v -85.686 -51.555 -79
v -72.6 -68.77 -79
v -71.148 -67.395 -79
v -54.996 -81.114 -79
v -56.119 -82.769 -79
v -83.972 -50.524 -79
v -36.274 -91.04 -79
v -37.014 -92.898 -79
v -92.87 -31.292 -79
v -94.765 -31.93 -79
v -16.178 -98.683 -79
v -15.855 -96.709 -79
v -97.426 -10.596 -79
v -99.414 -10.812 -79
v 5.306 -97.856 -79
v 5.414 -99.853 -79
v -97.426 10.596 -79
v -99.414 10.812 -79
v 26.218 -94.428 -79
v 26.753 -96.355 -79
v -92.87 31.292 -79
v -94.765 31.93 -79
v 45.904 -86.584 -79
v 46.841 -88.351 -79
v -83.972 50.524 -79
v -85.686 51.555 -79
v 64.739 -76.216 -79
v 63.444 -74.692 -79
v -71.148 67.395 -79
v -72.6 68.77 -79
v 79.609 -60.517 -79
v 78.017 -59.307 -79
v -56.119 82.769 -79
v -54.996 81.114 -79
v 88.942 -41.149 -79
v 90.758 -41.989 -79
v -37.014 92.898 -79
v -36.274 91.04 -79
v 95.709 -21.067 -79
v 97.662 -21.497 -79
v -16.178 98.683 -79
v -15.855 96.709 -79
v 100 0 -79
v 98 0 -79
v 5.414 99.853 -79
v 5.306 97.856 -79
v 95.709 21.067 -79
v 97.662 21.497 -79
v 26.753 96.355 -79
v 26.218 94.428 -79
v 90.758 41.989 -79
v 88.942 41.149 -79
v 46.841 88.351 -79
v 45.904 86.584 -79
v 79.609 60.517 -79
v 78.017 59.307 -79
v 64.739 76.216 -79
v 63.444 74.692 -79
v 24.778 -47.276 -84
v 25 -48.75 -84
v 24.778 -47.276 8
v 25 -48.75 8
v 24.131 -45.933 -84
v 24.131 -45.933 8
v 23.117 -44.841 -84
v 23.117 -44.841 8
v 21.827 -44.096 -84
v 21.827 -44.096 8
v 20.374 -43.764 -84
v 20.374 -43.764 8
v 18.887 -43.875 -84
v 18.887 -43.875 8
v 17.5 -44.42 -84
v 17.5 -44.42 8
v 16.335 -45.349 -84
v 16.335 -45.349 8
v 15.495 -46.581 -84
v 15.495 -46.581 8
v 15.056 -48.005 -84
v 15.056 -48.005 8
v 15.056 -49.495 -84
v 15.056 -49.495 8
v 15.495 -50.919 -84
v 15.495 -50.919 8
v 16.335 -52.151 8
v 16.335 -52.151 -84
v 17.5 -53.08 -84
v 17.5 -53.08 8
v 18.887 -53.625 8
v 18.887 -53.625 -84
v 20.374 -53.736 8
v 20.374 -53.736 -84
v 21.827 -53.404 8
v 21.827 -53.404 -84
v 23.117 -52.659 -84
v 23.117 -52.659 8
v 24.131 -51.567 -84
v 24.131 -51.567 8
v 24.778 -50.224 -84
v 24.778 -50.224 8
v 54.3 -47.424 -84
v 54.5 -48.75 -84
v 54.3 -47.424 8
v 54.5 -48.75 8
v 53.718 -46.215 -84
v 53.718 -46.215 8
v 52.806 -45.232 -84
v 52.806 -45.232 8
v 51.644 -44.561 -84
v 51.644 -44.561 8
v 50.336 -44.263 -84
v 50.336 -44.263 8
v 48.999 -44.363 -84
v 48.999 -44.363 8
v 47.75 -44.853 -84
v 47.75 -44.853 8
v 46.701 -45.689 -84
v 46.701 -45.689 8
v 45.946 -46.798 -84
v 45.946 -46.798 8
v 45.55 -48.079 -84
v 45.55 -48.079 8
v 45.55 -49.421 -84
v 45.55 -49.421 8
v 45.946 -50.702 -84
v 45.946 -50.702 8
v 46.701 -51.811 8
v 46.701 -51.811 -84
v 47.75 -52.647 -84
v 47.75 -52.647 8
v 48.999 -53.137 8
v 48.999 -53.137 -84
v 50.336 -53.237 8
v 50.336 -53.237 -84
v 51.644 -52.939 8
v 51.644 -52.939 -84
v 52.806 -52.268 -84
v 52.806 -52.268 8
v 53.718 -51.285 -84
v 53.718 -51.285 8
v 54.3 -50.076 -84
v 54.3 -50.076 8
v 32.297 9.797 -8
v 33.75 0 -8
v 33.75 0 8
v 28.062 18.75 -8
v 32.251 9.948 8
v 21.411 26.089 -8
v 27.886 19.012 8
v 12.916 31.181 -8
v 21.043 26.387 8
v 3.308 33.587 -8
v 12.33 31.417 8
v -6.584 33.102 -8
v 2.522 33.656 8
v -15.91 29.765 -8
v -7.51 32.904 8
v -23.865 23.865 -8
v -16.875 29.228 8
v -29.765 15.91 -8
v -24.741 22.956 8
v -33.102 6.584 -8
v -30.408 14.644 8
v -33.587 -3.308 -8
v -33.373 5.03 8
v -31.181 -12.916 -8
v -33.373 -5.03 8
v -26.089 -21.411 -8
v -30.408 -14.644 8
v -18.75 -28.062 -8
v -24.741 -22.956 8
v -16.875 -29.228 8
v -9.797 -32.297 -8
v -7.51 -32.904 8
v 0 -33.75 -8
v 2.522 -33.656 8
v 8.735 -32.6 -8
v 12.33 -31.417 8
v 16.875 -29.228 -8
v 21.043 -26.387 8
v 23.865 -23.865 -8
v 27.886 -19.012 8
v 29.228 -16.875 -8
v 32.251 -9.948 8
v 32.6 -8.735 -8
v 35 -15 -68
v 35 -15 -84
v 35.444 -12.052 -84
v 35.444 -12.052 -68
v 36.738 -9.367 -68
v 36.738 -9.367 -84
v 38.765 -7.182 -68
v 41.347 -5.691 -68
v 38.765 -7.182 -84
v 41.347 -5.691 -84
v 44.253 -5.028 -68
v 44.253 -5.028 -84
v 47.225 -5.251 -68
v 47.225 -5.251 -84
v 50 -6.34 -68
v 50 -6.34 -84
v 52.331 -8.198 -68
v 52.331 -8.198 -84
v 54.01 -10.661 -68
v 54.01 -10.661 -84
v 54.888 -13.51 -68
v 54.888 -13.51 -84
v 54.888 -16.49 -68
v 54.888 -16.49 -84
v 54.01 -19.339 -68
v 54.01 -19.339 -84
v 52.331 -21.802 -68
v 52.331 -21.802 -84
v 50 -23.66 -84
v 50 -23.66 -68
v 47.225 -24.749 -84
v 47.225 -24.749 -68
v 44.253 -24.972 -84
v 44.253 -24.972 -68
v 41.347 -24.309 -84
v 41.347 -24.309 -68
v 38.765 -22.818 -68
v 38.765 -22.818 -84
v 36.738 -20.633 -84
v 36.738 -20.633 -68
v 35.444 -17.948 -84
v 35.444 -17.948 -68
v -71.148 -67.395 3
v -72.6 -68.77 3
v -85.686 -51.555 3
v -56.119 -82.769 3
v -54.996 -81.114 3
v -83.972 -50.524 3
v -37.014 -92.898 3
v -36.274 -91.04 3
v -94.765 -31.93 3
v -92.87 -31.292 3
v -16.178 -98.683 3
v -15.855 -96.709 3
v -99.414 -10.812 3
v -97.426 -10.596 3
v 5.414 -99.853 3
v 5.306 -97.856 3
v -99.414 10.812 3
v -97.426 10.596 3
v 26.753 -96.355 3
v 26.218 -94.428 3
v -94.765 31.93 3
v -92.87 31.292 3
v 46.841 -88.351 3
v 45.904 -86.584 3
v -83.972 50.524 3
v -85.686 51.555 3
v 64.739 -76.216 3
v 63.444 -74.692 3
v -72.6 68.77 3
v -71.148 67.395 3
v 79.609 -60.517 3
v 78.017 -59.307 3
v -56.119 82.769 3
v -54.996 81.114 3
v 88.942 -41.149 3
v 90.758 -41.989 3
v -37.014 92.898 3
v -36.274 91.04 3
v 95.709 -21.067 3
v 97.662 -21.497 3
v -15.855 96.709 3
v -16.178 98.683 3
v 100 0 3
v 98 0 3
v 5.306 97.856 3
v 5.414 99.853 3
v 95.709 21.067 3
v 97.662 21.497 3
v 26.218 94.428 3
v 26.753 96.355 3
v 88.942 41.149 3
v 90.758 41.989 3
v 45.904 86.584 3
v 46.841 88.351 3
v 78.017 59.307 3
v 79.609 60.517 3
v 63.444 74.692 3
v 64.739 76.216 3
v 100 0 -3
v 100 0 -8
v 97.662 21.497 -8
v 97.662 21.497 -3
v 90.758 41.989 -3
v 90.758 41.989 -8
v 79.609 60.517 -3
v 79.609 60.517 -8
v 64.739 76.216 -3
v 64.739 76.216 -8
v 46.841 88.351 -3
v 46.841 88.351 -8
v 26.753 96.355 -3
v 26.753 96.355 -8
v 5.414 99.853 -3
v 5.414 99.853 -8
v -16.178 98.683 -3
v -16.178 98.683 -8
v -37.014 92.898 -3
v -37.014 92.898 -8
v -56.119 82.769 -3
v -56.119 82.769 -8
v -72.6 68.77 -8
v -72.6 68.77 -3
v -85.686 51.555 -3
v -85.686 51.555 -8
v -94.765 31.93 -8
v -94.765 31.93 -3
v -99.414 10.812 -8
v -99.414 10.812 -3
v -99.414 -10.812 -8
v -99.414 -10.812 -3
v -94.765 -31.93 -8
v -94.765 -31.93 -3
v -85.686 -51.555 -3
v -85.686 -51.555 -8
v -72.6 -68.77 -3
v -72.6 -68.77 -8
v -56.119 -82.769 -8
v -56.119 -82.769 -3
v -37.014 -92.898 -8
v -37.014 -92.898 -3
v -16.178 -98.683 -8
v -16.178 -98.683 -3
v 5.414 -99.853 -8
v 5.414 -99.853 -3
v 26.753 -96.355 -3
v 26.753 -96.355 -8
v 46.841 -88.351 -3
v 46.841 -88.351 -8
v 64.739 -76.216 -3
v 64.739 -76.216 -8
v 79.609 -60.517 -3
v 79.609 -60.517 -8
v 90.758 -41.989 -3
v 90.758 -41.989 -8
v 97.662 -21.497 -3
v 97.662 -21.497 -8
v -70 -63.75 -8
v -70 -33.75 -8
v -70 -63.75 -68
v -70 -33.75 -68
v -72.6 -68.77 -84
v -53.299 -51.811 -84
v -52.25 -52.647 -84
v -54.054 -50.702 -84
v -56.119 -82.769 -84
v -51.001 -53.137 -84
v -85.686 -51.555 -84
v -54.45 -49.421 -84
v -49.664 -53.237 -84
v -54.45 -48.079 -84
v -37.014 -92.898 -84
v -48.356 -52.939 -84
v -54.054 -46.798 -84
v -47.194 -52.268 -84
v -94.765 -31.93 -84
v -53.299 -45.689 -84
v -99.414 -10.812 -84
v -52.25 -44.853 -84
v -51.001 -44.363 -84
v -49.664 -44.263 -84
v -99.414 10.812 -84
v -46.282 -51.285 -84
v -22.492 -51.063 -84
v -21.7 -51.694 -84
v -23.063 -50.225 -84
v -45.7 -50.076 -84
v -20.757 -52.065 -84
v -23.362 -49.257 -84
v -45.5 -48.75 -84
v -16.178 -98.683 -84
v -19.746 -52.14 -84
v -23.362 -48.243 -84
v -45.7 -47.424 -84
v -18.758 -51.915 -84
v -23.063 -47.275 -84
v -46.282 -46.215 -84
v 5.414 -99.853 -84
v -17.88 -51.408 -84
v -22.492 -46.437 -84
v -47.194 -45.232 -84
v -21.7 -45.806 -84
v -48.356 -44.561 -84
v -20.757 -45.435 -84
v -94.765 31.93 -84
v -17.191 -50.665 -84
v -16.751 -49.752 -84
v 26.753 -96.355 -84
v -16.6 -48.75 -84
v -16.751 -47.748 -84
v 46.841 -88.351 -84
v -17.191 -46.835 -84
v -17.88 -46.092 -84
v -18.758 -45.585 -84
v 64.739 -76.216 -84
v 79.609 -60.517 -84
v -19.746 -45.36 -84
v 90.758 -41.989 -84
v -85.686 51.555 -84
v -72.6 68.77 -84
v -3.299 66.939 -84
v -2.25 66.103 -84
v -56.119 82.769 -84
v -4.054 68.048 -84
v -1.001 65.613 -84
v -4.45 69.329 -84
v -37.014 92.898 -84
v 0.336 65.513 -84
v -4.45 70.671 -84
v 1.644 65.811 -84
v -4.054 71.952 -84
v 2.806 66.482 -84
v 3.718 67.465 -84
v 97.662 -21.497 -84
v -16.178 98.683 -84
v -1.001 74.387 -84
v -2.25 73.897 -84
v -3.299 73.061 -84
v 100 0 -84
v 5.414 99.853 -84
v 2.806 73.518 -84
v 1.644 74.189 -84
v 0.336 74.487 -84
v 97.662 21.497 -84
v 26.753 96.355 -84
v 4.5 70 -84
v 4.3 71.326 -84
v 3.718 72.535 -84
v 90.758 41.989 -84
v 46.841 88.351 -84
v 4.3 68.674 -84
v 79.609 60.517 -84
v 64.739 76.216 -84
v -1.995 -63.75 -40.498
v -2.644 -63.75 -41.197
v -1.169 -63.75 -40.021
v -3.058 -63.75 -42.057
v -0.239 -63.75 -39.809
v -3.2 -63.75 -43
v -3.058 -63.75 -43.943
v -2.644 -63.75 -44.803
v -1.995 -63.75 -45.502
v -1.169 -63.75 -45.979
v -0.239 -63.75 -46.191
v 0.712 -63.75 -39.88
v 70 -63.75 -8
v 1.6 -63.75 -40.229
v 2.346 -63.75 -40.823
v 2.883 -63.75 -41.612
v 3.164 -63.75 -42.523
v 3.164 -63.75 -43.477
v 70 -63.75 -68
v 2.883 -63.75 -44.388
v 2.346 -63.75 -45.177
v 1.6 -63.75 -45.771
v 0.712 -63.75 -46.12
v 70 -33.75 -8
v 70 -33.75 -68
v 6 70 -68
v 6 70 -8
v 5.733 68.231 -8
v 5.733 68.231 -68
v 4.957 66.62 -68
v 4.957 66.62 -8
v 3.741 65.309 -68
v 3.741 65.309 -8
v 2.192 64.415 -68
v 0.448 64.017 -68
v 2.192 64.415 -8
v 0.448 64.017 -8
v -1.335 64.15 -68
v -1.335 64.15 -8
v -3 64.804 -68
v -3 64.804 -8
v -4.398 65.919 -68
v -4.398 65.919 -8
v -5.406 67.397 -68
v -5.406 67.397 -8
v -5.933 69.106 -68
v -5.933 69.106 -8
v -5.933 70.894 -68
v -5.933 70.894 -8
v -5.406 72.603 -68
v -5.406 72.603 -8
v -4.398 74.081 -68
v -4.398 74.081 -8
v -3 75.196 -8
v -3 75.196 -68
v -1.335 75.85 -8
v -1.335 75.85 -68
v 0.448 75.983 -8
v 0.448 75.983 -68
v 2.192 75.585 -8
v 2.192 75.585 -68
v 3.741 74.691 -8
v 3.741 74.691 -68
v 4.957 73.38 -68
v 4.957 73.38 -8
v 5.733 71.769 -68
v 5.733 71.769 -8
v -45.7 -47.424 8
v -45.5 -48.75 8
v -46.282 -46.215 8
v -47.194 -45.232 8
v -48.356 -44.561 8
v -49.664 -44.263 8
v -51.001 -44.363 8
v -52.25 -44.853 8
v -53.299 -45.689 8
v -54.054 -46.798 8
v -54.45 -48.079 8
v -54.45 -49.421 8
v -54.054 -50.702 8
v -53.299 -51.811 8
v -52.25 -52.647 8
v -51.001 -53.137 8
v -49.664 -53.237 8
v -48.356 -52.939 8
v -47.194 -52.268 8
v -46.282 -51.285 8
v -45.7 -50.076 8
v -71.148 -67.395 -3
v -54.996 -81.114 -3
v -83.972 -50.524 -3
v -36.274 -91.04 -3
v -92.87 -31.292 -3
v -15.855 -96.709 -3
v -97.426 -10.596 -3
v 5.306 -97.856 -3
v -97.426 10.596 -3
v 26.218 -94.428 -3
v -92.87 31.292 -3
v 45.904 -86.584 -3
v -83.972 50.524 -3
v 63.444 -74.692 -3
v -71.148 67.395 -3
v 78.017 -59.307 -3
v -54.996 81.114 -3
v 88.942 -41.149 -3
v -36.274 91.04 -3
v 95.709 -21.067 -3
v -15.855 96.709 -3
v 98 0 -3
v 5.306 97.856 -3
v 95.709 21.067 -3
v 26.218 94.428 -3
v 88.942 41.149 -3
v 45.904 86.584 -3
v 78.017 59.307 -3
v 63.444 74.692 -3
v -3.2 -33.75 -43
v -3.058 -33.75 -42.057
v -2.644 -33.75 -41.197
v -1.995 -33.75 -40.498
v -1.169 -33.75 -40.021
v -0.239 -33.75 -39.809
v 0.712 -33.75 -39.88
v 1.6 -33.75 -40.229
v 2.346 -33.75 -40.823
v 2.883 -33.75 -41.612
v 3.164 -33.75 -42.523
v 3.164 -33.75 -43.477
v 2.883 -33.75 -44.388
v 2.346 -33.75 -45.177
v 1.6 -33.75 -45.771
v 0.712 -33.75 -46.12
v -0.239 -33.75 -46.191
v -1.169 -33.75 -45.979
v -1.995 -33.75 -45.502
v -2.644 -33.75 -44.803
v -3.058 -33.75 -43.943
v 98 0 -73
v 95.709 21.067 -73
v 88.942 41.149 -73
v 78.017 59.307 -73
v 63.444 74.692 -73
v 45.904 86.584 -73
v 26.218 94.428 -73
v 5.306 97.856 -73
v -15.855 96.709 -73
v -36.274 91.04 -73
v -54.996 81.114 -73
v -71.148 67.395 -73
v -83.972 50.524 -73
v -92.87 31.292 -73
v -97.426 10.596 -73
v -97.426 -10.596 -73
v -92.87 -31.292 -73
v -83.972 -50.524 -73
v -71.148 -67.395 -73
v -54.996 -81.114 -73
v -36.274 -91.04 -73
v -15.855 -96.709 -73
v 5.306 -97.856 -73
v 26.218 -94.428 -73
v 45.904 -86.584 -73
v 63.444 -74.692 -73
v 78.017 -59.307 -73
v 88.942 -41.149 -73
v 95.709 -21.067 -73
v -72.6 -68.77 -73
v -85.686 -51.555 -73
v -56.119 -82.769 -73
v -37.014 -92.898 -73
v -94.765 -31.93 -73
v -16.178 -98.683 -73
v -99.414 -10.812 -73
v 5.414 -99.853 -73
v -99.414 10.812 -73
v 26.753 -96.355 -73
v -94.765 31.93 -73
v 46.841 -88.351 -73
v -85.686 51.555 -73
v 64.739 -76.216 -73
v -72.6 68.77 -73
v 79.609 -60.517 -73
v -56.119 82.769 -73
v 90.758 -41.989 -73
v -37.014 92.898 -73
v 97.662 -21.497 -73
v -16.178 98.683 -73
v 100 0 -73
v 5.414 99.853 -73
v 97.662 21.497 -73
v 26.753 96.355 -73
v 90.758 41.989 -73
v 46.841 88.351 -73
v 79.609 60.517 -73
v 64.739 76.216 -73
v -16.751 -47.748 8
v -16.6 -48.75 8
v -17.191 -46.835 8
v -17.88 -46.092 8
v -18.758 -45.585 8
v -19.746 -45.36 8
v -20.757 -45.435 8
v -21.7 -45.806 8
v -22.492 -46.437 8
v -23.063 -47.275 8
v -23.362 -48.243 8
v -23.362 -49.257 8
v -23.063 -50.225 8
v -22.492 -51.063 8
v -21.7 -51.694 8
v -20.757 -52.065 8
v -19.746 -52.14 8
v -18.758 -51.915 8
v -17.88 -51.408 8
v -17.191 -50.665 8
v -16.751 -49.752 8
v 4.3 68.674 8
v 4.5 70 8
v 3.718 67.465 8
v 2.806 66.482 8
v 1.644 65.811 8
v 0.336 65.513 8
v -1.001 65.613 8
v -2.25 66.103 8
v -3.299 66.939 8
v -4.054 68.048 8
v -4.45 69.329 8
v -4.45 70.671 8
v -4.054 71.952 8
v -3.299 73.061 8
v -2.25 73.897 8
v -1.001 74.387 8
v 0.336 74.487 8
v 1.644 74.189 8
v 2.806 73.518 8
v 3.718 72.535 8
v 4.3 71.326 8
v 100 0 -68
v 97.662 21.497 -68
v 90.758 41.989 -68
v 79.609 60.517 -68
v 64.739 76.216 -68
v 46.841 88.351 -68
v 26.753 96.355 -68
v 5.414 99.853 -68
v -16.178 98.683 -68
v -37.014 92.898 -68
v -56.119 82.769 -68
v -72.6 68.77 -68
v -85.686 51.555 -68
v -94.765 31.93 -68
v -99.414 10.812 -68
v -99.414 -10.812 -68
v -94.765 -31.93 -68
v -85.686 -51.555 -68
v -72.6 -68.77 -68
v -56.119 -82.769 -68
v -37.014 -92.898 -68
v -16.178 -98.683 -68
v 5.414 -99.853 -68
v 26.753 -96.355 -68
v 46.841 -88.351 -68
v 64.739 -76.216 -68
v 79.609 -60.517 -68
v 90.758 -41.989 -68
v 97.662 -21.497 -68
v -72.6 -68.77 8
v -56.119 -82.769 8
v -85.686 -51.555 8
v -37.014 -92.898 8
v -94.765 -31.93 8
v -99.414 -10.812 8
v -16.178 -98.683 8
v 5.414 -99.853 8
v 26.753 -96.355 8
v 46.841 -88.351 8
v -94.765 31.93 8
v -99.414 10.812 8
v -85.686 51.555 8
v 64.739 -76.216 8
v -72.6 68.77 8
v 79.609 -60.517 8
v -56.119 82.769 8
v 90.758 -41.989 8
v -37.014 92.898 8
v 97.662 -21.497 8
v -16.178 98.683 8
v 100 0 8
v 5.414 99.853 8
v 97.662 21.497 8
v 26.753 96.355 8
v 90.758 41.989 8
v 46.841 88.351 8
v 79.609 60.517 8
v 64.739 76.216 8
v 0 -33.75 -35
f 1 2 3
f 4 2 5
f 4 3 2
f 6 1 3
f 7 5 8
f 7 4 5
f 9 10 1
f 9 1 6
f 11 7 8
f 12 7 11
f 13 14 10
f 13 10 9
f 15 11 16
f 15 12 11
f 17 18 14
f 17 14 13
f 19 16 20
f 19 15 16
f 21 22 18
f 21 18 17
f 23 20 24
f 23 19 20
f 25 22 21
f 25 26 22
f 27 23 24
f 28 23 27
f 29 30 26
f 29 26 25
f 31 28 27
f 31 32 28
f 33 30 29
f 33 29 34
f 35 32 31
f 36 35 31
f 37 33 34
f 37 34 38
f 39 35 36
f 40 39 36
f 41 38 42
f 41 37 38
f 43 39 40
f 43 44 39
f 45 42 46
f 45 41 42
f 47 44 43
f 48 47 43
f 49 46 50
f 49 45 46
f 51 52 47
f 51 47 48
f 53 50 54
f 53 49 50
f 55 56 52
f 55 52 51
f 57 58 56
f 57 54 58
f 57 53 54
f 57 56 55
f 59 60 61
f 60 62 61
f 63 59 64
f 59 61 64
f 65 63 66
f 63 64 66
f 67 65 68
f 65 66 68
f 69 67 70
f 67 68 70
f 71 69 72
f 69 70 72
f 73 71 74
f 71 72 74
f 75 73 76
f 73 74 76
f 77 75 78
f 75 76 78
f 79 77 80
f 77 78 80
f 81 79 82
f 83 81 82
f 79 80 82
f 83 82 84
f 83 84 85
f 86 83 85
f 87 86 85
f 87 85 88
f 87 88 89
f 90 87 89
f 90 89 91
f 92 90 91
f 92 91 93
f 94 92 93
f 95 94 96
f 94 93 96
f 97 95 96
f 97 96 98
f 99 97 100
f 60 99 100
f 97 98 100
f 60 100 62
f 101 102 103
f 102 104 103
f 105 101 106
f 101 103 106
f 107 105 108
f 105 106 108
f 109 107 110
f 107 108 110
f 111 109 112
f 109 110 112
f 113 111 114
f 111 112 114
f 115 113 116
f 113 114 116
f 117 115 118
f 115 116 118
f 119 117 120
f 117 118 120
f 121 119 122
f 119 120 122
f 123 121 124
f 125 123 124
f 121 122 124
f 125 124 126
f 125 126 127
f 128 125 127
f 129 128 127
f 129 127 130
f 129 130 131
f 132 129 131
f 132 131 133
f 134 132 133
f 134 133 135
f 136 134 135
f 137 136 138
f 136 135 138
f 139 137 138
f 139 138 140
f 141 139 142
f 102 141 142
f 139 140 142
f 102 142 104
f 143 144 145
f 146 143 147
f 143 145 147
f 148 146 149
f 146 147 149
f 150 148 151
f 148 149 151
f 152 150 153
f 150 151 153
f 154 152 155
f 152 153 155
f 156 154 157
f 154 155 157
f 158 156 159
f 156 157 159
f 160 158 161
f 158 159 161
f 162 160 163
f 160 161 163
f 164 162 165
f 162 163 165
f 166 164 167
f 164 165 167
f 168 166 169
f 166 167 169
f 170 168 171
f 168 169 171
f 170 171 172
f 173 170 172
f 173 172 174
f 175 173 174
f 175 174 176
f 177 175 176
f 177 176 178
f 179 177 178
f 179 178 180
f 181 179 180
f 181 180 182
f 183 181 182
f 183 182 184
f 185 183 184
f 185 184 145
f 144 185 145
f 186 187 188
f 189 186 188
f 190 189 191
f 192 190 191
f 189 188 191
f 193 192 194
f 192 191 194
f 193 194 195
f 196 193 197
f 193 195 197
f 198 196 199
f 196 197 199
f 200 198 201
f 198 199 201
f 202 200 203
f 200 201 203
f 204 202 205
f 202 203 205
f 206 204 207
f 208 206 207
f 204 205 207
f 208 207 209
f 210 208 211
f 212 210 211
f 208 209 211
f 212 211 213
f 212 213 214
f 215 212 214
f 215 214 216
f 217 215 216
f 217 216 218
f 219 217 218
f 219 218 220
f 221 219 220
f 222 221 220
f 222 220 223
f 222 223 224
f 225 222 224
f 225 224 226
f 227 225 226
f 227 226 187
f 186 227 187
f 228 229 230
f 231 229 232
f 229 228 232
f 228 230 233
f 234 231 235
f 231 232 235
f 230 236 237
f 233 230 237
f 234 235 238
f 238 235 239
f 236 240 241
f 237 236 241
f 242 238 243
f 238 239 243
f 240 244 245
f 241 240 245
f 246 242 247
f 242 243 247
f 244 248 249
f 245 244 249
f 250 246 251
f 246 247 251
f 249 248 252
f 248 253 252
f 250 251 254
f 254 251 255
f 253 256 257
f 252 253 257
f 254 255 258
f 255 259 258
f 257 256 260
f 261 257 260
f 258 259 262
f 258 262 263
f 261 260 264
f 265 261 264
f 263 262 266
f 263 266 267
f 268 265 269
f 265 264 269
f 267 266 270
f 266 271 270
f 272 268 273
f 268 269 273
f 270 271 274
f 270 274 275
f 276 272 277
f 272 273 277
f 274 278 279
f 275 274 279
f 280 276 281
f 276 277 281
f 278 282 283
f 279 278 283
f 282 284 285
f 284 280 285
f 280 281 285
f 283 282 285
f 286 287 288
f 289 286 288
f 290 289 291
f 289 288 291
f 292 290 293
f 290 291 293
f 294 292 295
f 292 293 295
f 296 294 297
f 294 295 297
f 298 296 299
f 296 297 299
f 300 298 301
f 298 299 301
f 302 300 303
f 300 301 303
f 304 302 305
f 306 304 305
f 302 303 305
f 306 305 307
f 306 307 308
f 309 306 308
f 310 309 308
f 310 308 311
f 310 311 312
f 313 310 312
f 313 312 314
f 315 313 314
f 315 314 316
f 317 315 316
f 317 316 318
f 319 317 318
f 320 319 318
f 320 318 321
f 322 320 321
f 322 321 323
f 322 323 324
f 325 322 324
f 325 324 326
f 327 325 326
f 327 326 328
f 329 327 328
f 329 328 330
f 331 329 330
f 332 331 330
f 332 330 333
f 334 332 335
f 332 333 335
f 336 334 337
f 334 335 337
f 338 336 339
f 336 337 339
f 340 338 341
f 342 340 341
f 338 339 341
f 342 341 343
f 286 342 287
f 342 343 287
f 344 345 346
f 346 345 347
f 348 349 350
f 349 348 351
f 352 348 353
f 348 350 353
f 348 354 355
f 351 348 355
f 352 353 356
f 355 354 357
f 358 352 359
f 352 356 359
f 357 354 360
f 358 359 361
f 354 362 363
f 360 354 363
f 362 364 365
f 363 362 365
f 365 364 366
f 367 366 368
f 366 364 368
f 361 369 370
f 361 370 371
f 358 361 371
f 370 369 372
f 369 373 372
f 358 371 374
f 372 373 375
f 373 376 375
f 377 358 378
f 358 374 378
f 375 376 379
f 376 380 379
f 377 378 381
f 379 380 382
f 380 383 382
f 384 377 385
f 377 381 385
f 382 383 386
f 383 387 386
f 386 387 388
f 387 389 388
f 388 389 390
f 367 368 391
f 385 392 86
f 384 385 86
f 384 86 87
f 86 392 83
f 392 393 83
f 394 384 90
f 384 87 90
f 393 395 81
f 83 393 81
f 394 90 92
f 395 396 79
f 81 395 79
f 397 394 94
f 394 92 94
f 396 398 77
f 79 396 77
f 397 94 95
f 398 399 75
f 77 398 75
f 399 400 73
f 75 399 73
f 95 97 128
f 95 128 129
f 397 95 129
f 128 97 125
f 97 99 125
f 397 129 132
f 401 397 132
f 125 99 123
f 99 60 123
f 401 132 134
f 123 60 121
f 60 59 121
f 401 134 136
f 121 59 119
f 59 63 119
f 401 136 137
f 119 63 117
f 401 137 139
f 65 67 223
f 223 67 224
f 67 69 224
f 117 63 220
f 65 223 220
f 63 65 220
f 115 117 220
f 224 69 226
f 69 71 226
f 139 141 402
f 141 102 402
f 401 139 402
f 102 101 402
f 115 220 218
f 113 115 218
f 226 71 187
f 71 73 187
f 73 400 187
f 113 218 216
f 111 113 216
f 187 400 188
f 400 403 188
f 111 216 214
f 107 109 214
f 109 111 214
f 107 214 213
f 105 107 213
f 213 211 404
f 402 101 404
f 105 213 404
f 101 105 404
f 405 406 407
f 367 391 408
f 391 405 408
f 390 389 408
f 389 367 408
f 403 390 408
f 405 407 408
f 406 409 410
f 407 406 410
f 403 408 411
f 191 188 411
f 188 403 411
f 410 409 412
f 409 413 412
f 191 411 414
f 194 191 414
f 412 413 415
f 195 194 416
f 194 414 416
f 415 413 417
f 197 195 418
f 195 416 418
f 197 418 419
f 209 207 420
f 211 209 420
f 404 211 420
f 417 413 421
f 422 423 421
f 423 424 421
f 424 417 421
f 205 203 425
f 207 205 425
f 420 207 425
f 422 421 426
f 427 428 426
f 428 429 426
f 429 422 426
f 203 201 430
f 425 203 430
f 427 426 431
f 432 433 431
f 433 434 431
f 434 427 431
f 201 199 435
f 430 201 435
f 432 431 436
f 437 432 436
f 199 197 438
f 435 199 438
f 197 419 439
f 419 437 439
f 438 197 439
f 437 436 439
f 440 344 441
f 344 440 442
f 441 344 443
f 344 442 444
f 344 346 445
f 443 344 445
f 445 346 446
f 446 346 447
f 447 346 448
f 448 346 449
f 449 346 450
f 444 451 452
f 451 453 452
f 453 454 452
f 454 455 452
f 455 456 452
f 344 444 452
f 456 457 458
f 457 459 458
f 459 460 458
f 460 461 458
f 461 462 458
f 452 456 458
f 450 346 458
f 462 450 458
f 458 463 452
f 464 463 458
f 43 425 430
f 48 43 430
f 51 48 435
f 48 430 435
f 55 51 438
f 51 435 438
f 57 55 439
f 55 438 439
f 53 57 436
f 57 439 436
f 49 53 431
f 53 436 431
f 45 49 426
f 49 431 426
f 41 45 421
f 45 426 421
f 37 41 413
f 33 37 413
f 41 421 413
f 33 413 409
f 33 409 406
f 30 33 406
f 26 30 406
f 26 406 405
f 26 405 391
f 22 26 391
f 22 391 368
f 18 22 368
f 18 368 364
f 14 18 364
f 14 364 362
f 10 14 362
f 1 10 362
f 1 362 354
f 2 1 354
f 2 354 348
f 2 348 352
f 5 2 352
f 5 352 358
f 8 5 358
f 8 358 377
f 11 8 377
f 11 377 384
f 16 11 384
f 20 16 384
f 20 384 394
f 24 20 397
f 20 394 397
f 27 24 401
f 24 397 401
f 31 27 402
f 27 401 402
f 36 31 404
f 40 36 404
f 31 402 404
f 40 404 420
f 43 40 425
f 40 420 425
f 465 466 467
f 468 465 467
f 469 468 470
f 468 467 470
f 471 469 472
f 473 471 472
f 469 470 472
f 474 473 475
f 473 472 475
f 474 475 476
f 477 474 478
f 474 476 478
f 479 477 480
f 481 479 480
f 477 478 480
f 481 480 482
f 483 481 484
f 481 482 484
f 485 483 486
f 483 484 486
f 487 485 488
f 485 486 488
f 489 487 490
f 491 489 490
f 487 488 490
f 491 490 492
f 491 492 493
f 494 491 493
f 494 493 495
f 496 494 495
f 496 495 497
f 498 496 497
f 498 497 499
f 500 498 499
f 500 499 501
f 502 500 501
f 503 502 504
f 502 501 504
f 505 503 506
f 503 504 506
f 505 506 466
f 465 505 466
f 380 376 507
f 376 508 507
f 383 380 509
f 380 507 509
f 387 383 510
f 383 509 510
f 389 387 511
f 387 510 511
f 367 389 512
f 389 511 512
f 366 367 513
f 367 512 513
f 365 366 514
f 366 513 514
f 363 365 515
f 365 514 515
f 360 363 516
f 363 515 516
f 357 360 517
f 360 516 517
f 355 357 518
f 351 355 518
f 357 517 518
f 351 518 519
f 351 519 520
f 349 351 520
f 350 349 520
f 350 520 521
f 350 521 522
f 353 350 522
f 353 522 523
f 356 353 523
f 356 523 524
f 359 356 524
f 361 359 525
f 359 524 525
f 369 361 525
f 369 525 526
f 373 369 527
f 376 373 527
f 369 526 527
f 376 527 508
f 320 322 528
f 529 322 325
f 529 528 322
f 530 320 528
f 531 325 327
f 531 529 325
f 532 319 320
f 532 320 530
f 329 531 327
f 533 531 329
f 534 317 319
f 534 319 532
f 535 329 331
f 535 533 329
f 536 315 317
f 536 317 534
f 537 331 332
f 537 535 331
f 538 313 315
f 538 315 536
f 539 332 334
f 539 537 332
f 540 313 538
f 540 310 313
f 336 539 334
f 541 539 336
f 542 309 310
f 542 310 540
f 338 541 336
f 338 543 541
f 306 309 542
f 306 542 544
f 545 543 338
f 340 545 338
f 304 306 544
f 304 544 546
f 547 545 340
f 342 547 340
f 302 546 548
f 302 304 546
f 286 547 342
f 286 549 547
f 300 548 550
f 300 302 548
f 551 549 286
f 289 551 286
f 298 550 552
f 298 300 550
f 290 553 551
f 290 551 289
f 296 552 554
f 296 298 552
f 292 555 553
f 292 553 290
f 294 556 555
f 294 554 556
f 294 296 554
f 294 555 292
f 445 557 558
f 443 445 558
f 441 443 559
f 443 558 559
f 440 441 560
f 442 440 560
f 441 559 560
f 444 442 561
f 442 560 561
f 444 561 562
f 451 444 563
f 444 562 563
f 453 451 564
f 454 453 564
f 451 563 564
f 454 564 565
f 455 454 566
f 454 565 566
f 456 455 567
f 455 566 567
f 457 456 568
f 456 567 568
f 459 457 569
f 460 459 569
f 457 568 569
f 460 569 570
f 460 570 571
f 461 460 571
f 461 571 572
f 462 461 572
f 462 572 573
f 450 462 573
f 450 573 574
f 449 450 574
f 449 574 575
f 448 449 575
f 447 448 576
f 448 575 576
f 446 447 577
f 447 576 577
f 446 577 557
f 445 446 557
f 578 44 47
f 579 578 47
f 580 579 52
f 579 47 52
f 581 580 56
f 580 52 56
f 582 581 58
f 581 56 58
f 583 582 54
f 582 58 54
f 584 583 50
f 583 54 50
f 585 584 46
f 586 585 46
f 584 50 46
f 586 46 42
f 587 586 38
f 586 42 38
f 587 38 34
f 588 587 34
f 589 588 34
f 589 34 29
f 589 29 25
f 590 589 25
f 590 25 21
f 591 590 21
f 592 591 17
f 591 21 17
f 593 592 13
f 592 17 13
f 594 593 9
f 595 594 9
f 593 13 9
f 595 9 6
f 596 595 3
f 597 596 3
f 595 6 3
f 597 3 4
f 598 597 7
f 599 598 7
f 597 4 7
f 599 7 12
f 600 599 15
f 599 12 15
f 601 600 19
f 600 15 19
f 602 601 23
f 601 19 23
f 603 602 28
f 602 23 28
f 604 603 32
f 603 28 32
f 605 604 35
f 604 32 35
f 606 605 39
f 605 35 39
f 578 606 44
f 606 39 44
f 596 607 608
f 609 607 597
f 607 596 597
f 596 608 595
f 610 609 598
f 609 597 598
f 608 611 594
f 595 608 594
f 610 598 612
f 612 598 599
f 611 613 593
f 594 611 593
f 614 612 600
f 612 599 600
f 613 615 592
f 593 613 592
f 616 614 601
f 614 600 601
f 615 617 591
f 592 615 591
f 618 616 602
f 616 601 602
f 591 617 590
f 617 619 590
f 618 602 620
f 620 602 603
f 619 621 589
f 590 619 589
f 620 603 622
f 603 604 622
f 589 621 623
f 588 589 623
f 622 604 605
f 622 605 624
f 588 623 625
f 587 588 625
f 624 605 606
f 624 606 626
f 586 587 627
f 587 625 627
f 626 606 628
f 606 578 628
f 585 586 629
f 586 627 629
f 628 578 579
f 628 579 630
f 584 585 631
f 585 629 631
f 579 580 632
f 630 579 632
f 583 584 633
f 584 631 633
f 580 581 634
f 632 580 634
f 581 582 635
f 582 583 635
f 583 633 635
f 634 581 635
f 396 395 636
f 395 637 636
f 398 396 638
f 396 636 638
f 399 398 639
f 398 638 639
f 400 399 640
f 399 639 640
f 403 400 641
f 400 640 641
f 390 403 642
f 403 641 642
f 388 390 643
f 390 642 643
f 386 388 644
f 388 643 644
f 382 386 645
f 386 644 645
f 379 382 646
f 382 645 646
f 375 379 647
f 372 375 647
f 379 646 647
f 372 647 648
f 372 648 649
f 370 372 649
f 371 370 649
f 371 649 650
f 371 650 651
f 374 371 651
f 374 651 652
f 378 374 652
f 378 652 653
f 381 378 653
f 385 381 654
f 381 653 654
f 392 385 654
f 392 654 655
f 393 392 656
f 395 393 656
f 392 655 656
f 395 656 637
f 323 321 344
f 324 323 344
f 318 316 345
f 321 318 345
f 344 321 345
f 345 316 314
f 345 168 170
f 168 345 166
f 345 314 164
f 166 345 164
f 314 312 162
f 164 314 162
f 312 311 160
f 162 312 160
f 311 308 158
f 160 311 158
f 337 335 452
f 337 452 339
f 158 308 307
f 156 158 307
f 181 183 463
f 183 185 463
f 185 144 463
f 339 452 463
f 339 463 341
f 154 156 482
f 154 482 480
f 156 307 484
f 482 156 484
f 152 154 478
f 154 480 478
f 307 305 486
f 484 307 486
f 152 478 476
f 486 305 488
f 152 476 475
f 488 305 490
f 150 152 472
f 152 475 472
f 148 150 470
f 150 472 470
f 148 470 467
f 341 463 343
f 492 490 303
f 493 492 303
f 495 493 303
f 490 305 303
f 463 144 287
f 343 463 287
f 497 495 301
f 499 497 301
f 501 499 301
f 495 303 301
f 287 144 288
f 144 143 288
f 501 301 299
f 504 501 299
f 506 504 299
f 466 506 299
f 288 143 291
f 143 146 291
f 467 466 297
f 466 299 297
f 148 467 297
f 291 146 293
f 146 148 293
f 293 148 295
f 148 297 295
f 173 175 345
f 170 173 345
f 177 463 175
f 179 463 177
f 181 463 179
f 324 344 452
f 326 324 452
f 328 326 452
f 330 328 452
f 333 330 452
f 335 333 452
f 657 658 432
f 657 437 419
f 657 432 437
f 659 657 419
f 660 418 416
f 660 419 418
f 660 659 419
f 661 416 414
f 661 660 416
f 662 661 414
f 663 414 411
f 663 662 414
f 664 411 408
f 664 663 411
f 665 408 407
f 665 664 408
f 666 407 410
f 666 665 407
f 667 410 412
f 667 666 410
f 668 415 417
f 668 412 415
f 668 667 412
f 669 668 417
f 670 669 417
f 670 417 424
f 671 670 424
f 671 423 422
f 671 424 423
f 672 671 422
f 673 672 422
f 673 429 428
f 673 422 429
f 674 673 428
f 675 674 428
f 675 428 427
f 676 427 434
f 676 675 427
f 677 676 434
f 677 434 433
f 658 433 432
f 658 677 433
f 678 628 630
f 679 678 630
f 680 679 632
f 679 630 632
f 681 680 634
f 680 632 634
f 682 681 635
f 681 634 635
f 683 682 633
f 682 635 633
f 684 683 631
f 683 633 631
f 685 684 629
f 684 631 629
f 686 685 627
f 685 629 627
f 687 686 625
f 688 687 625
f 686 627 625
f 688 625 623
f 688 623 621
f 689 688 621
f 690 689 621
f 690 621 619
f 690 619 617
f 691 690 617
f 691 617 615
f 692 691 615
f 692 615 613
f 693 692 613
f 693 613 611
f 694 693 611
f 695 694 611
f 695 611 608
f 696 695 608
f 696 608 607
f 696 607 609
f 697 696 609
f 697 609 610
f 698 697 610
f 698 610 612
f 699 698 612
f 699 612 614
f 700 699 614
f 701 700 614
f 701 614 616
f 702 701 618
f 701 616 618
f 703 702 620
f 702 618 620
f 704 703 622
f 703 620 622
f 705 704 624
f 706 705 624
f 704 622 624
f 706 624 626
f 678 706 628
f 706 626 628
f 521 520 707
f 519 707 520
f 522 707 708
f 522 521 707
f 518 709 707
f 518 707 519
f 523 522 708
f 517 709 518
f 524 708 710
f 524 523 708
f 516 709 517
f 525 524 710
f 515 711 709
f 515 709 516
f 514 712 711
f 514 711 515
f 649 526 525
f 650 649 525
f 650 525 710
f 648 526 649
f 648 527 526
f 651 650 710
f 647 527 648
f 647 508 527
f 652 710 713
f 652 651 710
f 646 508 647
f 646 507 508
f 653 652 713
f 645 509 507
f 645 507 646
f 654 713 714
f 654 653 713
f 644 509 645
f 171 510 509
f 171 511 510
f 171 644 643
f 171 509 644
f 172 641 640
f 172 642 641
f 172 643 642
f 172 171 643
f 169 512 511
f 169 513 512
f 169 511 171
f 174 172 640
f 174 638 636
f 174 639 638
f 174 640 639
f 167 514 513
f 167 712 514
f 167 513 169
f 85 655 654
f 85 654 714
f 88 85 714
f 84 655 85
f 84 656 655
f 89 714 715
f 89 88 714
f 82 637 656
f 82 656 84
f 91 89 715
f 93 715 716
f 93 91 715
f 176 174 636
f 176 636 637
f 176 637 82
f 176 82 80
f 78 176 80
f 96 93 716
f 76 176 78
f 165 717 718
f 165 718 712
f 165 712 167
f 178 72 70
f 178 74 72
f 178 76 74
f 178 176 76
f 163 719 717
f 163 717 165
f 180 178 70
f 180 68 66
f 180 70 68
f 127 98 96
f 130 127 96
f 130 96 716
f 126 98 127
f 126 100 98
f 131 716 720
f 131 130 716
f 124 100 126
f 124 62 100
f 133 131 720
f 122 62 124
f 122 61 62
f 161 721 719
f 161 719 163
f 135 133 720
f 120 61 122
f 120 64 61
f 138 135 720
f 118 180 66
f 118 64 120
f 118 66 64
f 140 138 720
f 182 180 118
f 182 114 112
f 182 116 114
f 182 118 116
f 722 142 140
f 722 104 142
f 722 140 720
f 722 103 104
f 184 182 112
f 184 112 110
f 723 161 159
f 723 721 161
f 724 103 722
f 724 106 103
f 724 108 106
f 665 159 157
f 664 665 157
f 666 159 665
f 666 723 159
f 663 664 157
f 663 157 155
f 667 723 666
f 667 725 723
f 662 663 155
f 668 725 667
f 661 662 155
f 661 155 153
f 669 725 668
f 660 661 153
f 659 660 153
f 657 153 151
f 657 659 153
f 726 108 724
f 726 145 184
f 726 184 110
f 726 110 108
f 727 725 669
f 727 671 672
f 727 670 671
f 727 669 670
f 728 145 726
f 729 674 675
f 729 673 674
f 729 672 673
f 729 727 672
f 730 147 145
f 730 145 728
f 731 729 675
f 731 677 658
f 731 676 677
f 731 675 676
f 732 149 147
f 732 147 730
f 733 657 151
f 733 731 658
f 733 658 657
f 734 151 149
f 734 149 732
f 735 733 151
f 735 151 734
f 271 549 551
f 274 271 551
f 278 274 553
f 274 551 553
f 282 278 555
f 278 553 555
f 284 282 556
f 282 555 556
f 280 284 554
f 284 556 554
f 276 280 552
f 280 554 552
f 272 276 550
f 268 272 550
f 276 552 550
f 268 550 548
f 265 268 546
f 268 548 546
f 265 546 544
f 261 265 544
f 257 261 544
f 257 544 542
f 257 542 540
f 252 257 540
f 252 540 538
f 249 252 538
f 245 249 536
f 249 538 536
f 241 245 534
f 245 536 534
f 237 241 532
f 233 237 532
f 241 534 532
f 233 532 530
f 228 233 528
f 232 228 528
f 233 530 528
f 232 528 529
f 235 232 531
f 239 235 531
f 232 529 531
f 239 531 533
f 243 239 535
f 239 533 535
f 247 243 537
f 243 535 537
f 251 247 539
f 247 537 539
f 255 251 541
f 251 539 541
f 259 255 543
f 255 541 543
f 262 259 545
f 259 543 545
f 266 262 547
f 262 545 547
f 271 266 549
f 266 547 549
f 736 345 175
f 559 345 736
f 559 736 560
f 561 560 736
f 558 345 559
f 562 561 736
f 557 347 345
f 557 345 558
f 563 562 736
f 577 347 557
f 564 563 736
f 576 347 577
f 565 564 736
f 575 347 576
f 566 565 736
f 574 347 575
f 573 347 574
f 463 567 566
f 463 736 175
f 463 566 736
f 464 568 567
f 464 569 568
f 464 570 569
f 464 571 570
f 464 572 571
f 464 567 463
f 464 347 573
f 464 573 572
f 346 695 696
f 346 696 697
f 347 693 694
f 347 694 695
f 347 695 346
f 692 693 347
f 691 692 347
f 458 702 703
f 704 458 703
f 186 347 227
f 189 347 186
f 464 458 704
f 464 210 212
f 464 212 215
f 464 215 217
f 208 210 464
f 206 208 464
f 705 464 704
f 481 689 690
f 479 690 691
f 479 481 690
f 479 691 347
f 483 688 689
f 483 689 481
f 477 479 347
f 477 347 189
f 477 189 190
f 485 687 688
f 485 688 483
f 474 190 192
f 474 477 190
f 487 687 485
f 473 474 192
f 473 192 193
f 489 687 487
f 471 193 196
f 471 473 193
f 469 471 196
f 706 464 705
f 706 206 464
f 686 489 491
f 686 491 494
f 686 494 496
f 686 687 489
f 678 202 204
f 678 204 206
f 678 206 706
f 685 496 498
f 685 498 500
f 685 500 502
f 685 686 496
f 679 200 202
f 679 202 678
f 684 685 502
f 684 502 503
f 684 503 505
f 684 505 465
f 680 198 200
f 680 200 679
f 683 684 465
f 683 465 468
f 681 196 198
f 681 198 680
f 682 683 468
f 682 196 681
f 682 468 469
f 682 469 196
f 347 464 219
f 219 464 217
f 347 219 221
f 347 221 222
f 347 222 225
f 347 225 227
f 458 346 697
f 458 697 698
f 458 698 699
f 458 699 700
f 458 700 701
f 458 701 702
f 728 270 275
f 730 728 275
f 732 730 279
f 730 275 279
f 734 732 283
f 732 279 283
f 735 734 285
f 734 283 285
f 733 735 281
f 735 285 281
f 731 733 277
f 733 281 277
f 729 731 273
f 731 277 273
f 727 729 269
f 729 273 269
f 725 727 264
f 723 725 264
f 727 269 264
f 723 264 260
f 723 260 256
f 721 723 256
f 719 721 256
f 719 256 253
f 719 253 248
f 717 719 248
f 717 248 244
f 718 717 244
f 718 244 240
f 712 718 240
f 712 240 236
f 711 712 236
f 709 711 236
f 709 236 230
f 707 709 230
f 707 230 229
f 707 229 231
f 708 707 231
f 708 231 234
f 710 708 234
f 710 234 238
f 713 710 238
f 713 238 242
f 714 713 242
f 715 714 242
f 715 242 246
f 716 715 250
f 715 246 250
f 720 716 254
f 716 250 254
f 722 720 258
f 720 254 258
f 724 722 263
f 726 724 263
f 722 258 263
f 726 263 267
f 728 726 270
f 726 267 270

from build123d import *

# Parameters (mm, degrees)
BOSS_EXTRUDE1_DEPTH      = 8
BOSS_EXTRUDE1_DEPTH_BACK = 8
SKETCH2_R                = 100
CUT_EXTRUDE1_DEPTH       = 3
CUT_EXTRUDE1_DEPTH_BACK  = 3
SKETCH2_5_R              = 100
SKETCH2_5_R_2            = 98
LPATTERN1_COUNT          = 2
LPATTERN1_PITCH          = 76
SKETCH5_W                = 140
SKETCH5_H                = 60
SKETCH5_R                = 3.2
BOSS_EXTRUDE2_DEPTH      = 30
SKETCH7_R                = 4.5
SKETCH7_R_2              = 3.4
SKETCH7_R_3              = 5
CUT_EXTRUDE2_DEPTH       = 167
SKETCH3_R                = 33.75
CUT_EXTRUDE3_DEPTH       = 43
SKETCH10_R               = 6
BOSS_EXTRUDE3_DEPTH      = 60
CUT_EXTRUDE4_DEPTH       = 112
CUT_EXTRUDE4_DEPTH_BACK  = 60
SKETCH10_4_R             = 4.5
SKETCH11_R               = 10
CUT_EXTRUDE5_DEPTH       = 60


with BuildPart() as part:
    # Sketch2 → Boss-Extrude1 (new, two sides: drawn at the far end of the back side and taken through both)
    with BuildSketch(Plane.XY.offset(-BOSS_EXTRUDE1_DEPTH_BACK)):
        Circle(SKETCH2_R)
    extrude(amount=BOSS_EXTRUDE1_DEPTH + BOSS_EXTRUDE1_DEPTH_BACK)

    # Sketch2<5> → Cut-Extrude1 (cut, two sides: drawn at the far end of the back side and taken through both)
    with BuildSketch(Plane.XY.offset(-CUT_EXTRUDE1_DEPTH_BACK)):
        Circle(SKETCH2_5_R)
        Circle(SKETCH2_5_R_2, mode=Mode.SUBTRACT)
    extrude(amount=CUT_EXTRUDE1_DEPTH + CUT_EXTRUDE1_DEPTH_BACK, mode=Mode.SUBTRACT)


with BuildPart() as lpattern1_1:
    # LPattern1: pattern copy
    add(part.part.moved(Location(Vector(0, 0, -1) * (1 * LPATTERN1_PITCH))))


with BuildPart() as part_1:
    add(part.part)

    # Sketch5 → Boss-Extrude2 (add)
    with BuildSketch(Plane(origin=(0, -33.75, 0), x_dir=(1, 0, 0), z_dir=(0, 1, 0))):
        with Locations((0, 38)):
            Rectangle(SKETCH5_W, SKETCH5_H)
        with Locations((0, 43)):
            Circle(SKETCH5_R, mode=Mode.SUBTRACT)
    extrude(amount=-BOSS_EXTRUDE2_DEPTH)


with BuildPart() as cut_extrude2_tool:
    # Sketch7 → Cut-Extrude2 (new body)
    with BuildSketch(Plane.XY.offset(8)):
        with Locations((-50, -48.75)):
            Circle(SKETCH7_R)
        with Locations((50, -48.75)):
            Circle(SKETCH7_R)
        with Locations((-20, -48.75)):
            Circle(SKETCH7_R_2)
        with Locations((20, -48.75)):
            Circle(SKETCH7_R_3)
    extrude(amount=-CUT_EXTRUDE2_DEPTH)


with BuildPart() as part_2:
    add(part_1.part)

    # Cut-Extrude2: cut by cut_extrude2_tool
    add(cut_extrude2_tool.part, mode=Mode.SUBTRACT)

    # Sketch3 → Cut-Extrude3 (cut)
    with BuildSketch(Plane.XY.offset(8)):
        Circle(SKETCH3_R)
    extrude(amount=-CUT_EXTRUDE3_DEPTH, mode=Mode.SUBTRACT)



with BuildPart() as lpattern1_1_1:
    add(lpattern1_1.part)

    # Cut-Extrude2: cut by cut_extrude2_tool
    add(cut_extrude2_tool.part, mode=Mode.SUBTRACT)


with BuildPart() as part_3:
    add(part_2.part)

    add(lpattern1_1_1.part)  # Boss-Extrude3 merges LPattern1_1
    # Sketch10 → Boss-Extrude3 (add)
    with BuildSketch(Plane(origin=(0, 0, -8), x_dir=(-1, 0, 0), z_dir=(0, 0, -1))):
        with Locations((0, 70)):
            Circle(SKETCH10_R)
    extrude(amount=BOSS_EXTRUDE3_DEPTH)

    # Sketch10<4> → Cut-Extrude4 (cut, two sides: drawn at the far end of the back side and taken through both)
    with BuildSketch(Plane(origin=(0, 0, -8), x_dir=(-1, 0, 0), z_dir=(0, 0, -1)).offset(-CUT_EXTRUDE4_DEPTH_BACK)):
        with Locations((0, 70)):
            Circle(SKETCH10_4_R)
    extrude(amount=CUT_EXTRUDE4_DEPTH + CUT_EXTRUDE4_DEPTH_BACK, mode=Mode.SUBTRACT)

    # Sketch11 → Cut-Extrude5 (cut)
    with BuildSketch(Plane(origin=(0, 0, -84), x_dir=(-1, 0, 0), z_dir=(0, 0, -1))):
        with Locations((-45, -15)):
            Circle(SKETCH11_R)
    extrude(amount=-CUT_EXTRUDE5_DEPTH, mode=Mode.SUBTRACT)


solid = part_3.part
